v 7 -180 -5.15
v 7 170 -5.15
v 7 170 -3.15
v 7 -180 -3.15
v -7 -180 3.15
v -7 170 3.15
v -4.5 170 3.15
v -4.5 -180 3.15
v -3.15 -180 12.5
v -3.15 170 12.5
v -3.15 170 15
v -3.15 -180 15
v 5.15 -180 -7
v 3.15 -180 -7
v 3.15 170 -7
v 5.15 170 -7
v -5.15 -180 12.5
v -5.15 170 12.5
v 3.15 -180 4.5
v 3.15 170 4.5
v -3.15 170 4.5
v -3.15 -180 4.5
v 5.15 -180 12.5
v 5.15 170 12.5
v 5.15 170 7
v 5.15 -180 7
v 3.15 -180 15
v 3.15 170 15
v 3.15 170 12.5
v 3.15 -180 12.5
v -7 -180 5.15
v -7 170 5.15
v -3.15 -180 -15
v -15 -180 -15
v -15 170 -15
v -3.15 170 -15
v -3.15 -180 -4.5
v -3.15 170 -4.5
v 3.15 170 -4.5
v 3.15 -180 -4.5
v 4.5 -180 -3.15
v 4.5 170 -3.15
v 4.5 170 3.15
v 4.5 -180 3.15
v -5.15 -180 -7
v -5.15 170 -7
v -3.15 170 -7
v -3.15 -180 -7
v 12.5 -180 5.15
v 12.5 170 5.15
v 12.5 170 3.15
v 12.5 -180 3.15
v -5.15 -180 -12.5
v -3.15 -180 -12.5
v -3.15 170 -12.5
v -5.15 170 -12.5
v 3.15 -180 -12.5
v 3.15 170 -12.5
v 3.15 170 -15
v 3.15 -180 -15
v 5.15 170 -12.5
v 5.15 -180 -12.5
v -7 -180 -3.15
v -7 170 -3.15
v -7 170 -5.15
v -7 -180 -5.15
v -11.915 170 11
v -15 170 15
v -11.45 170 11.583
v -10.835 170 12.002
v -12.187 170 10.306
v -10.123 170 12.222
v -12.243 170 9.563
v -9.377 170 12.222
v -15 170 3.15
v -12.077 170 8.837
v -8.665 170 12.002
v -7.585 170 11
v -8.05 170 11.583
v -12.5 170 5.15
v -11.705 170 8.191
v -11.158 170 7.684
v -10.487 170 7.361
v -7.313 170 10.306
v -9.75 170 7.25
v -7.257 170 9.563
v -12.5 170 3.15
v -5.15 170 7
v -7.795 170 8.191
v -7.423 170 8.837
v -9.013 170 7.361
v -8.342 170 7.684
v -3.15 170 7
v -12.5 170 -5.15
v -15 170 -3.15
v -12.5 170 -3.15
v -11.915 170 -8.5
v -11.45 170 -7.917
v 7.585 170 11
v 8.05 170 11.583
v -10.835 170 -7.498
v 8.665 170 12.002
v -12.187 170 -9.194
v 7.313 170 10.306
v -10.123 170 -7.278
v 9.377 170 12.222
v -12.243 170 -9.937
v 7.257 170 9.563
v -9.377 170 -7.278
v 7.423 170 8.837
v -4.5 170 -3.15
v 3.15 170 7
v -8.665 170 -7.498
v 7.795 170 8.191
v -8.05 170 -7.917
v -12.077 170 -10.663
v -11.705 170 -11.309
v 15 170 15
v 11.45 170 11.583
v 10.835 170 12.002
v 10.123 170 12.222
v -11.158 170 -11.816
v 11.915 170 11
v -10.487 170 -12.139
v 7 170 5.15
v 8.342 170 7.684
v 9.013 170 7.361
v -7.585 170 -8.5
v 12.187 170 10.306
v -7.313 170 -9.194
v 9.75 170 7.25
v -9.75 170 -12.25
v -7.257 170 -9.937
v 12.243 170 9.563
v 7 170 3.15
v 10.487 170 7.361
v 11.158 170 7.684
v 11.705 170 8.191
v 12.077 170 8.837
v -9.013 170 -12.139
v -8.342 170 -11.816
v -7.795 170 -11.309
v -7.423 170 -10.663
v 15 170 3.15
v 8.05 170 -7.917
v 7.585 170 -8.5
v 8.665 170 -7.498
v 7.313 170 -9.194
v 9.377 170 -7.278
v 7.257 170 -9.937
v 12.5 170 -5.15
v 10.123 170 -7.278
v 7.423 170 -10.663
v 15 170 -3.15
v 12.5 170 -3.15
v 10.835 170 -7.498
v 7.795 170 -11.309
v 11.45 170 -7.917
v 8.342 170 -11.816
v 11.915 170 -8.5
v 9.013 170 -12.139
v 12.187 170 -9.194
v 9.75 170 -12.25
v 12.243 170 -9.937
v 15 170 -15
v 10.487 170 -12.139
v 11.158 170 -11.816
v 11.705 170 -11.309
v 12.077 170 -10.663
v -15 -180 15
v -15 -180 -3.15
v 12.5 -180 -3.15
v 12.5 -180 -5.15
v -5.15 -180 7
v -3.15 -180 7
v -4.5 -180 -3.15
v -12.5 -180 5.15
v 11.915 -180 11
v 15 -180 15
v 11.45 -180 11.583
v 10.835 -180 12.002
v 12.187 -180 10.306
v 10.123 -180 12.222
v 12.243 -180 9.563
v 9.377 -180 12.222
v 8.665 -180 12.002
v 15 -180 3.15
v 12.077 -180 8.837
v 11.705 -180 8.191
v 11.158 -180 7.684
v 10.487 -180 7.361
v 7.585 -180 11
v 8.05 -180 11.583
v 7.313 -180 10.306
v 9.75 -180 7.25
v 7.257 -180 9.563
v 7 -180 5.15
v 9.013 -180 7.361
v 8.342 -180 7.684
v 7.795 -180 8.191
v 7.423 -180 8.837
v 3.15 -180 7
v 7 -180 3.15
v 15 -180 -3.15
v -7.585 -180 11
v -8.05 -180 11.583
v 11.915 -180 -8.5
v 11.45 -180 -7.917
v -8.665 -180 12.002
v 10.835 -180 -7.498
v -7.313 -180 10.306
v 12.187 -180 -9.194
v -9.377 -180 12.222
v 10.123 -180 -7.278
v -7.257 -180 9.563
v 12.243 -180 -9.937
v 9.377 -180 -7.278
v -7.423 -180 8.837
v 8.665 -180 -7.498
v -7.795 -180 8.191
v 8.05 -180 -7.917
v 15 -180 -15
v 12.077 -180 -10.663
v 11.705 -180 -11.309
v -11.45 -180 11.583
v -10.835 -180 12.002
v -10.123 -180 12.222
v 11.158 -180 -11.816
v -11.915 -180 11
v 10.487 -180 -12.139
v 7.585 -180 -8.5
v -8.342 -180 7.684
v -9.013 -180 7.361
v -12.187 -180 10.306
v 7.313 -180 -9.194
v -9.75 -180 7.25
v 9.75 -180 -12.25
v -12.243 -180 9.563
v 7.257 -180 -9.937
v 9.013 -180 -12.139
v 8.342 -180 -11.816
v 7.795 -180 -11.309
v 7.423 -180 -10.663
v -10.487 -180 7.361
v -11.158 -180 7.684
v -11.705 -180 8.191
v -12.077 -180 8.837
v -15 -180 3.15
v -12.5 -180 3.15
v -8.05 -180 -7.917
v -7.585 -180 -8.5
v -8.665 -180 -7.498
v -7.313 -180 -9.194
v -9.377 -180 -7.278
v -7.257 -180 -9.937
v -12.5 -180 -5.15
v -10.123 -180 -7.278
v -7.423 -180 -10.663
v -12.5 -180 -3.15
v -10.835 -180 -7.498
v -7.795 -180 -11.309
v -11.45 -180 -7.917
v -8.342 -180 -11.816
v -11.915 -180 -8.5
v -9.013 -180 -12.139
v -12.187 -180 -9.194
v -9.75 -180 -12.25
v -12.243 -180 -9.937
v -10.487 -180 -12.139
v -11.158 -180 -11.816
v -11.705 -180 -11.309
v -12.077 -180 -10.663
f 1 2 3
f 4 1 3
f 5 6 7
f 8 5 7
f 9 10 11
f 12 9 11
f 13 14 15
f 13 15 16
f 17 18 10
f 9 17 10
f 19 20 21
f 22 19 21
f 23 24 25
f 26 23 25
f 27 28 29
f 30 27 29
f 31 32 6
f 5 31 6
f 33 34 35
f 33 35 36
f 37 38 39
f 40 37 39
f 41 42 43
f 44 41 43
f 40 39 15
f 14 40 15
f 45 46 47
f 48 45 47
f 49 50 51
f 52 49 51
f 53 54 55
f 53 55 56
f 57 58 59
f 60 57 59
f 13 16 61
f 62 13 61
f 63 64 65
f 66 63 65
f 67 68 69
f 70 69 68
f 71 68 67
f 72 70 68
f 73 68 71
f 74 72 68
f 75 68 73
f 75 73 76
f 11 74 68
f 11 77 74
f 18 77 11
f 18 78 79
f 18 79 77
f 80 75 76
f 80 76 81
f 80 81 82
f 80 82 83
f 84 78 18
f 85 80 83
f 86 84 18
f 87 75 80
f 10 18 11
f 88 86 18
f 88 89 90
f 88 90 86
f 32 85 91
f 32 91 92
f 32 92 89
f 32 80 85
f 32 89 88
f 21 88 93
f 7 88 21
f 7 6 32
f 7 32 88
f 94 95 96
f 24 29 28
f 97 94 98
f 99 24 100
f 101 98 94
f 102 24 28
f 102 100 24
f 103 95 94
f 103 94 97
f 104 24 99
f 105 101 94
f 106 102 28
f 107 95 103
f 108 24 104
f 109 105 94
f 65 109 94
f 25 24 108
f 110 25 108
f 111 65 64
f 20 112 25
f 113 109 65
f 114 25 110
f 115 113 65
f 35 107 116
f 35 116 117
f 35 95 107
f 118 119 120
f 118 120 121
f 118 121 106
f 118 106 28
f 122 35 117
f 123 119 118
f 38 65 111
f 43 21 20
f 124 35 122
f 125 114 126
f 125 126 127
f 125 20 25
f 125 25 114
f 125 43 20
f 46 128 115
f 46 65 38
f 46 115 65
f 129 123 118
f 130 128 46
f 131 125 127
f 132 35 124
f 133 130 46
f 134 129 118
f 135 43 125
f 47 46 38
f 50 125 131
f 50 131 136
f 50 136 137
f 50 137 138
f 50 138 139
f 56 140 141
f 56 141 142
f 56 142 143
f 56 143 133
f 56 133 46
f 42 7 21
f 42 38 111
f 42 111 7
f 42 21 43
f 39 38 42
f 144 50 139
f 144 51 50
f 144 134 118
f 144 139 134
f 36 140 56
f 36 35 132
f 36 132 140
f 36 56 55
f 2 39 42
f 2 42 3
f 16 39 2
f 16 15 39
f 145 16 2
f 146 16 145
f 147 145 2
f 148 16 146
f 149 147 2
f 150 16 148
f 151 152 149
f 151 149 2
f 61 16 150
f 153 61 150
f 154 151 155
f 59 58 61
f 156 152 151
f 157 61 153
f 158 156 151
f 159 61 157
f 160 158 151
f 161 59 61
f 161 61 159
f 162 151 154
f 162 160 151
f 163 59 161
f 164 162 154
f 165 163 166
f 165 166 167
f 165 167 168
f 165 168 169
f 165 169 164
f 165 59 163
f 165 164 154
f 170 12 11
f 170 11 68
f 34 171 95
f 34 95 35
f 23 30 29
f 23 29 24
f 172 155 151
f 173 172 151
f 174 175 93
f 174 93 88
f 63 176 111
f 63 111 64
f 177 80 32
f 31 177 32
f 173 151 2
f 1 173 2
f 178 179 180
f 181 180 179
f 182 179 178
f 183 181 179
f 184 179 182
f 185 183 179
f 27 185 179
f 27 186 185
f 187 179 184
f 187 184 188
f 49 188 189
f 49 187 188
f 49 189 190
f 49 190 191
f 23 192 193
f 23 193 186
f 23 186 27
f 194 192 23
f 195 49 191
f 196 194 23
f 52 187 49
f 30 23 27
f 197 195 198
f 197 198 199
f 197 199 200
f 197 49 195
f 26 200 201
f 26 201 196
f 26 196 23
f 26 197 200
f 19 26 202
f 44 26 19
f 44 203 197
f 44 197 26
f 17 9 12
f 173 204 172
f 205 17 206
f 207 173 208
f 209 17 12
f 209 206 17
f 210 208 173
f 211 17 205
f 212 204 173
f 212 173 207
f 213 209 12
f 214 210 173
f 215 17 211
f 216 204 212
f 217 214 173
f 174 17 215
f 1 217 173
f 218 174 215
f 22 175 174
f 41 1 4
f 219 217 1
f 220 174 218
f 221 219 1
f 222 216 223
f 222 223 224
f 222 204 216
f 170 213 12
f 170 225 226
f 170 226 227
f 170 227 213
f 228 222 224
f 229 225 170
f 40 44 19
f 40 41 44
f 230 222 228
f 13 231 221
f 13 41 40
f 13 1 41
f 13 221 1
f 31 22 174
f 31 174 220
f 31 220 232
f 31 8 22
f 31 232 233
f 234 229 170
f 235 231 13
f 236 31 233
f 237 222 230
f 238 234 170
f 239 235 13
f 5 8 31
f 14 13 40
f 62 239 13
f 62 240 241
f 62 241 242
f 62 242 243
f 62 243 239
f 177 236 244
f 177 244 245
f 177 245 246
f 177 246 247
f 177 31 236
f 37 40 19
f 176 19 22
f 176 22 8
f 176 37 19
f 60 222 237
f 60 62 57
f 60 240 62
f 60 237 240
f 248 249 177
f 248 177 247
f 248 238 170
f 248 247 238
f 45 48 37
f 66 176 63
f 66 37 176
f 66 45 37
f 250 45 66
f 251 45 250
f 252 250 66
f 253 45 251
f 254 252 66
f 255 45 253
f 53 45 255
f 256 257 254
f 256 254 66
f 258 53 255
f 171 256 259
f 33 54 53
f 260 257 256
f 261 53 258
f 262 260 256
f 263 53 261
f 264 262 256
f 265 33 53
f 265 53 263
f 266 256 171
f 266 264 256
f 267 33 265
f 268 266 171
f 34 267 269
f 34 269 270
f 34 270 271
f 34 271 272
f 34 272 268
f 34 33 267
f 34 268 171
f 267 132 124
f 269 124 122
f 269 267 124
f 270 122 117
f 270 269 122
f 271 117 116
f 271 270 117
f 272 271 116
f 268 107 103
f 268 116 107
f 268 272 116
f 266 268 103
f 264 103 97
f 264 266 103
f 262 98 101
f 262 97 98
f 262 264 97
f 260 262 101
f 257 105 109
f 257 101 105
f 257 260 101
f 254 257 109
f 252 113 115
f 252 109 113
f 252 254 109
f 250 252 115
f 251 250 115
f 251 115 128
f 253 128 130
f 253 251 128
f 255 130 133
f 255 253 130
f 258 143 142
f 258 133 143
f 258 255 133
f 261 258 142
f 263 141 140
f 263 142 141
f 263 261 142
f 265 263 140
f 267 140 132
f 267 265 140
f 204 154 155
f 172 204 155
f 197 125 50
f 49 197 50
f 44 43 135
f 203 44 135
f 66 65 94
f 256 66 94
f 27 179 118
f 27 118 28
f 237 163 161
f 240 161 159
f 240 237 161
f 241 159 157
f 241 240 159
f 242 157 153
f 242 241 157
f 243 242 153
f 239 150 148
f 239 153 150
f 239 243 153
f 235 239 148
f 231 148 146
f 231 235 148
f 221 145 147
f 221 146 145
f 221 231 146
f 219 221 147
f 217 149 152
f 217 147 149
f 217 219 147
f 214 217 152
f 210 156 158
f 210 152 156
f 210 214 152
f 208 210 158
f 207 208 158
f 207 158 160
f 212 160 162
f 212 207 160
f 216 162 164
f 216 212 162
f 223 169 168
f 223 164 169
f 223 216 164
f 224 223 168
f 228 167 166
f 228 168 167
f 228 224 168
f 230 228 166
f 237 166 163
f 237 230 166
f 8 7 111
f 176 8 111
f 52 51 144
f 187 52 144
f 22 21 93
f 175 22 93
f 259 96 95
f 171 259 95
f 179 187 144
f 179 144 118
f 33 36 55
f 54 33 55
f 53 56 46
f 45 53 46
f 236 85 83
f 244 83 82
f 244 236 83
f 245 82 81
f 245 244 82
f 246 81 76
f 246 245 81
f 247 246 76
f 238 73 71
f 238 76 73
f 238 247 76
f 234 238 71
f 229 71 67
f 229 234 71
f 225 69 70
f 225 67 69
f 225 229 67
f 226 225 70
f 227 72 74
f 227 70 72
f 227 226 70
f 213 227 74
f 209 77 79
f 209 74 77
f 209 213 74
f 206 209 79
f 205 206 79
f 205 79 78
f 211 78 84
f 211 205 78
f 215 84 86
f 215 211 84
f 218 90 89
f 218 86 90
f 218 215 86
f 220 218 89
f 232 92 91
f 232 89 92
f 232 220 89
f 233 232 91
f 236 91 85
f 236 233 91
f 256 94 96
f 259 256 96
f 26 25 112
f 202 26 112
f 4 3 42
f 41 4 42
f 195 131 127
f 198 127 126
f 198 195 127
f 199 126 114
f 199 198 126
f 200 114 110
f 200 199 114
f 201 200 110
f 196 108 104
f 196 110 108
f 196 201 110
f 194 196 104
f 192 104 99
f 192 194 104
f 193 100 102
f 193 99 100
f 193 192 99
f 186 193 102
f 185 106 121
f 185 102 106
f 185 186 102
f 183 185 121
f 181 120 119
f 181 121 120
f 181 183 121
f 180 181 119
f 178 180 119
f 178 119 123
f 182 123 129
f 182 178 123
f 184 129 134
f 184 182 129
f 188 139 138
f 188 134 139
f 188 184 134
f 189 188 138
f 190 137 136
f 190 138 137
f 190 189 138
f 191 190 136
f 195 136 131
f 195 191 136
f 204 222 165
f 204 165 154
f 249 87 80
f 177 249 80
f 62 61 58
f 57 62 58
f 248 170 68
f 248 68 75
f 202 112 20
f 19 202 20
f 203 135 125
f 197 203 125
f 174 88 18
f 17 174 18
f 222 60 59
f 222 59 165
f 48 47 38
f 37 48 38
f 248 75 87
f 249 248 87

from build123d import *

# Parameters (mm, degrees)
SKETCH_1_R          = 2.5
EXTRUDE_1_DEPTH     = 180
SKETCH_2_R          = 82.250528809
CUT_EXTRUDE_1_DEPTH = 10


with BuildPart() as part:
    # 草图1 → 凸台-拉伸1 (new, symmetric)
    with BuildSketch(Plane(origin=(0, 0, 0), x_dir=(1, 0, 0), z_dir=(0, 1, 0))):
        Polygon((-15, -3.15), (-12.5, -3.15), (-12.5, -5.15), (-7, -5.15), (-7, -3.15), (-4.5, -3.15), (-4.5, 3.15), (-7, 3.15), (-7, 5.15), (-12.5, 5.15), (-12.5, 3.15), (-15, 3.15), (-15, 15), (-3.15, 15), (-3.15, 12.5), (-5.15, 12.5), (-5.15, 7), (-3.15, 7), (-3.15, 4.5), (3.15, 4.5), (3.15, 7), (5.15, 7), (5.15, 12.5), (3.15, 12.5), (3.15, 15), (15, 15), (15, 3.15), (12.5, 3.15), (12.5, 5.15), (7, 5.15), (7, 3.15), (4.5, 3.15), (4.5, -3.15), (7, -3.15), (7, -5.15), (12.5, -5.15), (12.5, -3.15), (15, -3.15), (15, -15), (3.15, -15), (3.15, -12.5), (5.15, -12.5), (5.15, -7), (3.15, -7), (3.15, -4.5), (-3.15, -4.5), (-3.15, -7), (-5.15, -7), (-5.15, -12.5), (-3.15, -12.5), (-3.15, -15), (-15, -15), align=None)
        with Locations(Location((-9.75, -9.75, 0), (0, 0, 90))):
            Circle(SKETCH_1_R, mode=Mode.SUBTRACT)
        with Locations(Location((-9.75, 9.75, 0), (0, 0, 90))):
            Circle(SKETCH_1_R, mode=Mode.SUBTRACT)
        with Locations(Location((9.75, 9.75, 0), (0, 0, 90))):
            Circle(SKETCH_1_R, mode=Mode.SUBTRACT)
        with Locations(Location((9.75, -9.75, 0), (0, 0, 90))):
            Circle(SKETCH_1_R, mode=Mode.SUBTRACT)
    extrude(amount=EXTRUDE_1_DEPTH, both=True)

    # 草图2 → 切除-拉伸1 (cut)
    with BuildSketch(Plane(origin=(0, 180, 0), x_dir=(1, 0, 0), z_dir=(0, 1, 0))):
        Circle(SKETCH_2_R)
    extrude(amount=-CUT_EXTRUDE_1_DEPTH, mode=Mode.SUBTRACT)


solid = part.part
